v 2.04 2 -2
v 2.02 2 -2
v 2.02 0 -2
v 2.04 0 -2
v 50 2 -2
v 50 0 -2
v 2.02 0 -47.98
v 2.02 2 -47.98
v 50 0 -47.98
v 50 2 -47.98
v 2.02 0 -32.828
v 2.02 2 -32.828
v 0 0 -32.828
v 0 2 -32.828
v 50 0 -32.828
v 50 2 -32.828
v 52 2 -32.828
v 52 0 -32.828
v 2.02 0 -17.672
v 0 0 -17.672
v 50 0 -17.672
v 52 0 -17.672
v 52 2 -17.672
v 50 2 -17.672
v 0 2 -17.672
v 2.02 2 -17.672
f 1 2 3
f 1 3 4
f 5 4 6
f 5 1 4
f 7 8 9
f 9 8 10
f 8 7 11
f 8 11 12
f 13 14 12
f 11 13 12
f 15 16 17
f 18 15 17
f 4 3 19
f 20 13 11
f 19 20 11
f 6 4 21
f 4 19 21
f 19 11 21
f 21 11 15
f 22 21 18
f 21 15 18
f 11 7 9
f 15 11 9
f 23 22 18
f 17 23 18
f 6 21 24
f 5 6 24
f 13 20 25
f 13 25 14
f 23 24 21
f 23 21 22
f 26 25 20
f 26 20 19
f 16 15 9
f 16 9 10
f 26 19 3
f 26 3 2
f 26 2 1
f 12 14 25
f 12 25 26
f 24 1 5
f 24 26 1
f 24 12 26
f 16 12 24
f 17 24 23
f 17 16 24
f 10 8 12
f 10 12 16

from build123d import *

# Parameters (mm, degrees)
ESQUISSE1_W              = 52
ESQUISSE1_H              = 50
BOSS_EXTRU_1_DEPTH       = 2
EMPREINTE1_START         = -50
EMPREINTE1_OUTLINE_W     = 2.02
EMPREINTE1_OUTLINE_H     = 2
EMPREINTE1_OUTLINE_W_2   = 49.9598
EMPREINTE1_DEPTH         = 2.02
EMPREINTE1_START_2       = -2
EMPREINTE1_2_OUTLINE_W   = 2.02
EMPREINTE1_2_OUTLINE_H   = 2
EMPREINTE1_2_OUTLINE_W_2 = 49.9598
EMPREINTE1_2_DEPTH       = 2
EMPREINTE1_START_3       = -17.67235879
EMPREINTE1_3_OUTLINE_W   = 2.02
EMPREINTE1_3_OUTLINE_H   = 2
EMPREINTE1_3_OUTLINE_W_2 = 2
EMPREINTE1_3_DEPTH       = 15.67235879
EMPREINTE1_START_4       = -47.98
EMPREINTE1_4_OUTLINE_W   = 2.02
EMPREINTE1_4_OUTLINE_H   = 2
EMPREINTE1_4_OUTLINE_W_2 = 2
EMPREINTE1_4_DEPTH       = 15.15235879
ESQUISSE2_W              = 9.61940452
ESQUISSE2_H              = 3.700848348
ESQUISSE2_W_2            = 14.786584651
ESQUISSE2_H_2            = 4.070824207
ENL_V_MAT_EXTRU_1_DEPTH  = 2


# Read off the part's stored shape, not the designer's step: Empreinte1
with BuildPart() as part:
    # Esquisse1 → Boss.-Extru.1 (new body)
    with BuildSketch(Plane(origin=(0, 0, 0), x_dir=(1, 0, 0), z_dir=(0, 1, 0))):
        with Locations((26, 25)):
            Rectangle(ESQUISSE1_W, ESQUISSE1_H)
    extrude(amount=BOSS_EXTRU_1_DEPTH)

    # Empreinte1 outline → Empreinte1 (cut)
    with BuildSketch(Plane.XY.offset(EMPREINTE1_START)):
        with Locations((1.01, 1)):
            Rectangle(EMPREINTE1_OUTLINE_W, EMPREINTE1_OUTLINE_H)
        with Locations((27.0201, 1)):
            Rectangle(EMPREINTE1_OUTLINE_W_2, EMPREINTE1_OUTLINE_H)
    extrude(amount=EMPREINTE1_DEPTH, mode=Mode.SUBTRACT)

    # Empreinte1 2 outline → Empreinte1 2 (cut)
    with BuildSketch(Plane.XY.offset(EMPREINTE1_START_2)):
        with Locations((1.01, 1)):
            Rectangle(EMPREINTE1_2_OUTLINE_W, EMPREINTE1_2_OUTLINE_H)
        with Locations((27.0201, 1)):
            Rectangle(EMPREINTE1_2_OUTLINE_W_2, EMPREINTE1_2_OUTLINE_H)
    extrude(amount=EMPREINTE1_2_DEPTH, mode=Mode.SUBTRACT)

    # Empreinte1 3 outline → Empreinte1 3 (cut)
    with BuildSketch(Plane.XY.offset(EMPREINTE1_START_3)):
        with Locations((1.01, 1)):
            Rectangle(EMPREINTE1_3_OUTLINE_W, EMPREINTE1_3_OUTLINE_H)
        with Locations((51, 1)):
            Rectangle(EMPREINTE1_3_OUTLINE_W_2, EMPREINTE1_3_OUTLINE_H)
    extrude(amount=EMPREINTE1_3_DEPTH, mode=Mode.SUBTRACT)

    # Empreinte1 4 outline → Empreinte1 4 (cut)
    with BuildSketch(Plane.XY.offset(EMPREINTE1_START_4)):
        with Locations((1.01, 1)):
            Rectangle(EMPREINTE1_4_OUTLINE_W, EMPREINTE1_4_OUTLINE_H)
        with Locations((51, 1)):
            Rectangle(EMPREINTE1_4_OUTLINE_W_2, EMPREINTE1_4_OUTLINE_H)
    extrude(amount=EMPREINTE1_4_DEPTH, mode=Mode.SUBTRACT)

    # Esquisse2 → Enlèv. mat.-Extru.1 (cut)
    with BuildSketch(Plane(origin=(0, 2, 0), x_dir=(1, 0, 0), z_dir=(0, 1, 0))):
        with Locations((1.626508817, 49.830424174)):
            Rectangle(ESQUISSE2_W, ESQUISSE2_H)
        with Locations((5.120042554, -0.035412104)):
            Rectangle(ESQUISSE2_W_2, ESQUISSE2_H_2)
    extrude(amount=-ENL_V_MAT_EXTRU_1_DEPTH, mode=Mode.SUBTRACT)


solid = part.part
